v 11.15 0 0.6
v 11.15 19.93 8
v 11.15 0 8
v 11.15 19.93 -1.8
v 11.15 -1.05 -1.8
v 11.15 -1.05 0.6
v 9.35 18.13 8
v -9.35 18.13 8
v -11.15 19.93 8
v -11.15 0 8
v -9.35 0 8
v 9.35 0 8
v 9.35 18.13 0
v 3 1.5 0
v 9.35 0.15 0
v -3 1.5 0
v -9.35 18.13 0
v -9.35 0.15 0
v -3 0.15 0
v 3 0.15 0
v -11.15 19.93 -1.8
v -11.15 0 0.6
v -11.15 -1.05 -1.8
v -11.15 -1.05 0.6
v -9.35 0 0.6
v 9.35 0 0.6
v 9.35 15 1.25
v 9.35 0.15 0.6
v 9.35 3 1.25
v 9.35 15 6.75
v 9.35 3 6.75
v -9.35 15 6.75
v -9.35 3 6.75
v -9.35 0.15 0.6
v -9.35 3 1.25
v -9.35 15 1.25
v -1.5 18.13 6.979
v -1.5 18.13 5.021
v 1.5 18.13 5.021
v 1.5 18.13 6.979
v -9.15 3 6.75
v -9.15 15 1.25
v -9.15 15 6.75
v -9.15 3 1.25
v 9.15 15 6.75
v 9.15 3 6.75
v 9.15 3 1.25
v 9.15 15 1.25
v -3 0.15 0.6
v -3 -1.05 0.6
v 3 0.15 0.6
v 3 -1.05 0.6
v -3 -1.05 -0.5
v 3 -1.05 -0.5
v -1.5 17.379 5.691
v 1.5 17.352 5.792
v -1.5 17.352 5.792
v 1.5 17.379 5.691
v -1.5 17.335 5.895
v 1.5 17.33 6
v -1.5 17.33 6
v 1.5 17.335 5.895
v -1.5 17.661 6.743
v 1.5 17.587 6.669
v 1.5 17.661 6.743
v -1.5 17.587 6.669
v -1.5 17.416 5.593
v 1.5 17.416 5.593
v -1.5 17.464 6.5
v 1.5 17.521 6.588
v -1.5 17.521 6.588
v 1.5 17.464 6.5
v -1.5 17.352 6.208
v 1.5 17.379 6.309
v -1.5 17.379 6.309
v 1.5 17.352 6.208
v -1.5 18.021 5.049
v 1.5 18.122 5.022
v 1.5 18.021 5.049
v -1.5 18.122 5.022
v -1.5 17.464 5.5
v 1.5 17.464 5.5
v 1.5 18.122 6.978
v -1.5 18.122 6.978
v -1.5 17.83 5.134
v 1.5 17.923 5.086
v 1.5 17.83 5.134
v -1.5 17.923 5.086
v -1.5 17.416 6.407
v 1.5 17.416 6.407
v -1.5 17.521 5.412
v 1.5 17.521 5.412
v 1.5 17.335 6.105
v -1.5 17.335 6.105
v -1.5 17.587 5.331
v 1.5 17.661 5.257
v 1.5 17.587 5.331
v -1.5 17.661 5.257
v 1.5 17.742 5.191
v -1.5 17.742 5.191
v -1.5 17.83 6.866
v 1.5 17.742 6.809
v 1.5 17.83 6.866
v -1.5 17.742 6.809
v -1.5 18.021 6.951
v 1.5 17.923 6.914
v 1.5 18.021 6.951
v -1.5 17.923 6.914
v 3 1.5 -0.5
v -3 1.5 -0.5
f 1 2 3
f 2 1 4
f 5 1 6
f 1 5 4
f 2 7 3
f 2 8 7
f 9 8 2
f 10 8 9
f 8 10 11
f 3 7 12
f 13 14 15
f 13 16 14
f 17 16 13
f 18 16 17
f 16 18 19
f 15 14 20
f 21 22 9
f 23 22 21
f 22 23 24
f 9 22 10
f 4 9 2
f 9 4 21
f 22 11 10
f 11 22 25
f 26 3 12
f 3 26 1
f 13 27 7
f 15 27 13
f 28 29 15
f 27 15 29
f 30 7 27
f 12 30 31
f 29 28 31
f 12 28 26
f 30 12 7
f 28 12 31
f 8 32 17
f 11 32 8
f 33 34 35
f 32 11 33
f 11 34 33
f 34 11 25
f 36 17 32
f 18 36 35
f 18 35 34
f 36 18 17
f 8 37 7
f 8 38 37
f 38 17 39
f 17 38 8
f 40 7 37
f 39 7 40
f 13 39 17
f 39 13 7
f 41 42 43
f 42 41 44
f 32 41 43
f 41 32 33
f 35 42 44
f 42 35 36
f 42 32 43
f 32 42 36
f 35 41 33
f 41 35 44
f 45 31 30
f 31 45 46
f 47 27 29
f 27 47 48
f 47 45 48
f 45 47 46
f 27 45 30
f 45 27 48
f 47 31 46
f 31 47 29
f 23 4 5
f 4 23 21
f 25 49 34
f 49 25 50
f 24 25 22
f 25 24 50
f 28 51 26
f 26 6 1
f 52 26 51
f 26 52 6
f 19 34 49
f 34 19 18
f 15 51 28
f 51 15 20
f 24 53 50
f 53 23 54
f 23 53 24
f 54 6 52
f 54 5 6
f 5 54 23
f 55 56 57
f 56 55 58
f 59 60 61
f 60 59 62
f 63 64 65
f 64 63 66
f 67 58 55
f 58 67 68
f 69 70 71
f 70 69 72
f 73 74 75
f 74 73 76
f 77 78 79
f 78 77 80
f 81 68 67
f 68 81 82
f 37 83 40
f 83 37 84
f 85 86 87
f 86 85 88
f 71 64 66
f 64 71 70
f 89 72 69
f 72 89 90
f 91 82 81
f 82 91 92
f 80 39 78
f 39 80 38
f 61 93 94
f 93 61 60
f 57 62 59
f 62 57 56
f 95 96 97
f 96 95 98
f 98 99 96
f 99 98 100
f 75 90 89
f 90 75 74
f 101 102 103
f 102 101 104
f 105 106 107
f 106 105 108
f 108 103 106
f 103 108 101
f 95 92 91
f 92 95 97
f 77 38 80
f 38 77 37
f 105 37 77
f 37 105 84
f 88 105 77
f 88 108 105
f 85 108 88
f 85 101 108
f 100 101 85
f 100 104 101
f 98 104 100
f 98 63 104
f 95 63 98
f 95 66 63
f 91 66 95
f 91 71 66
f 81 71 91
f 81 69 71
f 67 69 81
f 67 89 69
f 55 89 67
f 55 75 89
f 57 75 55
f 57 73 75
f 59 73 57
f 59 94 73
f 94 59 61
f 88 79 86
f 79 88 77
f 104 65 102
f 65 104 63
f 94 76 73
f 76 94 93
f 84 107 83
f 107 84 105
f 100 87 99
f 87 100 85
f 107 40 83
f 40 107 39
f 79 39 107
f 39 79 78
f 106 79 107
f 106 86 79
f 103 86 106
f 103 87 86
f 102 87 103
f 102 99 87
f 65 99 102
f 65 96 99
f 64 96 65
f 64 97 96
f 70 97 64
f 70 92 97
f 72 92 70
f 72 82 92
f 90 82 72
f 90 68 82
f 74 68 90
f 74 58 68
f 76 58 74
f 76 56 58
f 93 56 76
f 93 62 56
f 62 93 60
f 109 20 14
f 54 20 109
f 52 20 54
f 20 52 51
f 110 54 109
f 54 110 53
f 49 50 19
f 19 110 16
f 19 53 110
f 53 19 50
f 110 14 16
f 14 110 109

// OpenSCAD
module Wago(
  n=3,
  wagoY=18.13,
  wagoX=5.6,
  wagoH=8.0,
  wagoXwall=0.95,
  bt=1.8
){
   difference(){
      union(){
         difference(){
            translate([0,(wagoY+bt)/2,wagoH/2])
               cube([n*wagoX+2*wagoXwall+2*bt,wagoY+bt,wagoH],center=true);
            translate([0,wagoY/2,wagoH/2])
               cube([n*wagoX+2*wagoXwall,wagoY,wagoH],center=true);
         }
         translate([(n*wagoX+2*wagoXwall)/2*-1+0.1,9,4])
            cube([0.2,12,5.5],center=true);
         translate([(n*wagoX+2*wagoXwall)/2-0.1,9,4])
            cube([0.2,12,5.5],center=true);
         translate([0,(wagoY+bt)/2,bt/2*-1])
            color("blue")
            cube([n*wagoX+2*wagoXwall+2*bt,wagoY+bt,bt],center=true);
         translate([0,bt/4*-1,(bt-0.6)/2*-1])
            color("green")
            cube([n*wagoX+2*wagoXwall+2*bt,bt/1.5,bt+0.6],center=true);
         translate([0,wagoY+0.2,6])
            rotate(a=90,v=[0,1,0])
            cylinder(d=2,h=3,$fn=60,center=true);
      }
      translate([0,0,bt-0.5])
         color("green")
         cube([6,3,bt*2],center=true);

   }





}

Wago(n=3);
